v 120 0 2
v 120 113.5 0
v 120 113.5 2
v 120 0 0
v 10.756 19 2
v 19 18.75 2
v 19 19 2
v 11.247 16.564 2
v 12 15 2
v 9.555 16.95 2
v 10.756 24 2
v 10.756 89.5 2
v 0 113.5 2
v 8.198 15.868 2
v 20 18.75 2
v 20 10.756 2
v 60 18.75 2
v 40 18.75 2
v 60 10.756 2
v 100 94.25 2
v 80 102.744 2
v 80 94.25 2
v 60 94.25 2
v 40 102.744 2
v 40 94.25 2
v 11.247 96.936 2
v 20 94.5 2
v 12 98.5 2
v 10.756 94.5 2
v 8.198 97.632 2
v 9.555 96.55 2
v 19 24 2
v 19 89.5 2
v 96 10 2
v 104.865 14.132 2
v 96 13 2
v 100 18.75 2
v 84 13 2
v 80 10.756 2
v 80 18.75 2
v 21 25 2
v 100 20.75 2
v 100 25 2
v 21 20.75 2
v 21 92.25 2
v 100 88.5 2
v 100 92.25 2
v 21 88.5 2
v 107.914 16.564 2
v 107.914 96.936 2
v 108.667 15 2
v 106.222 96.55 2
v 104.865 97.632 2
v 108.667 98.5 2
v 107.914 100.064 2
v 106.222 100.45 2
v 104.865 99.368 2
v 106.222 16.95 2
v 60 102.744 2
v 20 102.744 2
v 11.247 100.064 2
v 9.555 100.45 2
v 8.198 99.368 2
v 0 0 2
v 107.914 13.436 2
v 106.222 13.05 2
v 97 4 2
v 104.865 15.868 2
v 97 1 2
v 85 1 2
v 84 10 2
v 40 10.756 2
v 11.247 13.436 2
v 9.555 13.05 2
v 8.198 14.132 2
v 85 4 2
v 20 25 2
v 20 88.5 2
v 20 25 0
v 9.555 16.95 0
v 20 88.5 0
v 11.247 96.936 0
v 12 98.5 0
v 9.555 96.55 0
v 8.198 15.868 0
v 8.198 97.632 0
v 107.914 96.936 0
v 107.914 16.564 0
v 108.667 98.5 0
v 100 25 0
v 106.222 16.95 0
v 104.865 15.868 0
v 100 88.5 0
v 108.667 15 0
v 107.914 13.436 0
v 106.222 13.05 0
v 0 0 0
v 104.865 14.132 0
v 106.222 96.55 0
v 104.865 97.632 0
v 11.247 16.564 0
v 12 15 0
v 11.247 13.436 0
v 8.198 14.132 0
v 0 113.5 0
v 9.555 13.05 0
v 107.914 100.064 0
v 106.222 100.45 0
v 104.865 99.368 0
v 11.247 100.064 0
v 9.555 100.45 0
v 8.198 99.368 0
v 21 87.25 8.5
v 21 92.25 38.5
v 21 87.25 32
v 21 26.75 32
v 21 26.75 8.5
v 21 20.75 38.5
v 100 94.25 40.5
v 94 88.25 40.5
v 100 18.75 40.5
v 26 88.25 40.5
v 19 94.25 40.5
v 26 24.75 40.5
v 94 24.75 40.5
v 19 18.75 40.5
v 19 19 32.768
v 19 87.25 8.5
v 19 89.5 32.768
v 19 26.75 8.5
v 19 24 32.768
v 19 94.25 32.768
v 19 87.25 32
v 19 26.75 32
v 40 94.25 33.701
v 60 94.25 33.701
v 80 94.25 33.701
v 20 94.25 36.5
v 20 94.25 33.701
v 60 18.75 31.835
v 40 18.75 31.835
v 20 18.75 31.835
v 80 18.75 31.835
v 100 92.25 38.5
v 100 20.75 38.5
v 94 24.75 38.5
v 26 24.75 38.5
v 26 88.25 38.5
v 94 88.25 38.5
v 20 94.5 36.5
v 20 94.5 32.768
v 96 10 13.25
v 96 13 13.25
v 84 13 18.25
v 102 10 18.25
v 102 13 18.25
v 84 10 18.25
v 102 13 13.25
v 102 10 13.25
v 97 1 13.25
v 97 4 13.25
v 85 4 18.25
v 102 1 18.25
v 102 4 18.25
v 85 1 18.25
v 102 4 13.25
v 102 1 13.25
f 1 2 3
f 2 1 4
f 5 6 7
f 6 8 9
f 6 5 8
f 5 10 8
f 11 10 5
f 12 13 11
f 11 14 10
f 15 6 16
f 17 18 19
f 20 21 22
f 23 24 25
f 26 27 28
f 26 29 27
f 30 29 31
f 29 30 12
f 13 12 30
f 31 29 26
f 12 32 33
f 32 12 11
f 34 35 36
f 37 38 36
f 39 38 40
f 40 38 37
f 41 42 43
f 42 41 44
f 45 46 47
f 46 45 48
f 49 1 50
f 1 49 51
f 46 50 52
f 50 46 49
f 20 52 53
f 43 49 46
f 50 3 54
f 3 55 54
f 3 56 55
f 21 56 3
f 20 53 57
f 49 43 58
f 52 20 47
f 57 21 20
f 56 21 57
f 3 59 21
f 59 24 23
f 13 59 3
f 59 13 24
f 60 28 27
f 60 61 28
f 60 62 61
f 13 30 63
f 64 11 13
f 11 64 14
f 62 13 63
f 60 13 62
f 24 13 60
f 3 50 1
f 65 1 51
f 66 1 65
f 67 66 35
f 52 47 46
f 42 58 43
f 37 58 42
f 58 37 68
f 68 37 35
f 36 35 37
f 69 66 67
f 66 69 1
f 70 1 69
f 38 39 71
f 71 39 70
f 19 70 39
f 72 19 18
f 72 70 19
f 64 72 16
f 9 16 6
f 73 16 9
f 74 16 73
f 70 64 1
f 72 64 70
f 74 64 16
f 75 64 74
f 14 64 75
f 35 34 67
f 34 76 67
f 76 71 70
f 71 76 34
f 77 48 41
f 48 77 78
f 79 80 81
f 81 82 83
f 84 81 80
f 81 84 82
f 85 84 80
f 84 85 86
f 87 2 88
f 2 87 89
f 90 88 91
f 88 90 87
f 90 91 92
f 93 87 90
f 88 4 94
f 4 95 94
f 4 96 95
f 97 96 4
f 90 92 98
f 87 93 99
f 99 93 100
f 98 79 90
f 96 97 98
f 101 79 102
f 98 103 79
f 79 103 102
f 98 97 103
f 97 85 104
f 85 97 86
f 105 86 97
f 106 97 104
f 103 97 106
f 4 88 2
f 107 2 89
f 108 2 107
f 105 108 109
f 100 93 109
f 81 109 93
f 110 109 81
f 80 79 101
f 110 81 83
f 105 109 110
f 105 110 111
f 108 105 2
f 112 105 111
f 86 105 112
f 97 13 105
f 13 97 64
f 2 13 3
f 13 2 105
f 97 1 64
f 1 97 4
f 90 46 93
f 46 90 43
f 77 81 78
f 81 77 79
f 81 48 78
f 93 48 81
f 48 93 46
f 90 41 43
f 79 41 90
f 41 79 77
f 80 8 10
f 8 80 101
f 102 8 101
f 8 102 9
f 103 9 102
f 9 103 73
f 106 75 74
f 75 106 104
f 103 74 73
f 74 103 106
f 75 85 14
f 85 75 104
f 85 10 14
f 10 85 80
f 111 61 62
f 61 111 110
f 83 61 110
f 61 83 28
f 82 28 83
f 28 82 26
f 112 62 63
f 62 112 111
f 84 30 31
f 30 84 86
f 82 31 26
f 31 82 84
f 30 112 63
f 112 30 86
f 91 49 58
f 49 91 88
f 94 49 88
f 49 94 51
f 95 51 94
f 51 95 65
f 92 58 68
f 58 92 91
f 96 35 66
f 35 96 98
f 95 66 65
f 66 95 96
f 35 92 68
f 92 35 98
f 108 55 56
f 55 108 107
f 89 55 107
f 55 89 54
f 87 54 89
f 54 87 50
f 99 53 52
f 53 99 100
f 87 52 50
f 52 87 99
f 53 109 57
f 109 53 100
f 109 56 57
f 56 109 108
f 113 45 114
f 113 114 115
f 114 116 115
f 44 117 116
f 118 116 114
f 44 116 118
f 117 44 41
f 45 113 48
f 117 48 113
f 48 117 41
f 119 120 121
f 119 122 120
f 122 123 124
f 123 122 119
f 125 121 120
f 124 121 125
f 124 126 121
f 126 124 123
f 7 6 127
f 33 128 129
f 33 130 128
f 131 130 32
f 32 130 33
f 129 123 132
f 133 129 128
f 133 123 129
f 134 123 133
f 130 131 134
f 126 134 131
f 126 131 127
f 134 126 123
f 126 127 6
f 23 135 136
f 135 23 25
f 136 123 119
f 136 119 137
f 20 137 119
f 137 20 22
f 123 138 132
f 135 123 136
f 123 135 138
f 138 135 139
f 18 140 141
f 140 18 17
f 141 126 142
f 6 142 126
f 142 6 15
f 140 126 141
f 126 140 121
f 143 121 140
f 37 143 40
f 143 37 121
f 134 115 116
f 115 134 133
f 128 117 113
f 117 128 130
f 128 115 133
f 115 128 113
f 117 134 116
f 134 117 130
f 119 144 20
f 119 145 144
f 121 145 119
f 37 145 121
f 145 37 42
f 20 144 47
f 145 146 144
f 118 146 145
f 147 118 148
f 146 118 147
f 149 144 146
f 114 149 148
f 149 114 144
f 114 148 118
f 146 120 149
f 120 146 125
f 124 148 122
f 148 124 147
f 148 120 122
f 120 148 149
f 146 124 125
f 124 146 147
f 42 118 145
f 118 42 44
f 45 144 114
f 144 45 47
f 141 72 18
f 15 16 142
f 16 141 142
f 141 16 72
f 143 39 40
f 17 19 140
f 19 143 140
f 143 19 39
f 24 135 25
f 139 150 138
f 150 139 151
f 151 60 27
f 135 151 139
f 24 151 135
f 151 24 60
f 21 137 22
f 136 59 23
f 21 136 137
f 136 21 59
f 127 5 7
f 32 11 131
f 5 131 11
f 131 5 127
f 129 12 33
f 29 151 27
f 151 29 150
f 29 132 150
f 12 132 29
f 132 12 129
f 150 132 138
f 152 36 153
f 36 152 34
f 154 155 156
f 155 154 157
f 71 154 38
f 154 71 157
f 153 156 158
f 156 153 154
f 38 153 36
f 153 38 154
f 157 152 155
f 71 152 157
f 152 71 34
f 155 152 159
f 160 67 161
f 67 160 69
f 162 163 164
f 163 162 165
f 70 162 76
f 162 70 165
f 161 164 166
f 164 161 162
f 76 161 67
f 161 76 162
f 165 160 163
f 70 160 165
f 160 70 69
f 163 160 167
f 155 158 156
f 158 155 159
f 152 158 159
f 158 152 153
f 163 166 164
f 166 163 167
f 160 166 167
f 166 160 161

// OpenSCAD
width =     160/2;
depth =     73.5;
height = 36.5;
thick =      2;
plateSpacing = 40;
holder = 5;

difference() {
    cube([width + plateSpacing , depth + plateSpacing ,  thick]);
    translate([plateSpacing / 2, holder + plateSpacing / 2, -1]) cube([width , depth - (holder * 2) ,  thick + 2]);
    translate([(plateSpacing)/4 , plateSpacing / 2 - 5, -1])cylinder(20, 2,2);
    translate([(plateSpacing)/4 , depth + plateSpacing / 2 + 5 , -1])cylinder(20, 2,2);
    translate([width + plateSpacing / 1.5, plateSpacing / 2 - 5, -1])cylinder(20, 2,2);
    translate([width + plateSpacing / 1.5, depth + plateSpacing / 2 + 5 , -1])cylinder(20, 2,2);
}

module case() {
    cube([width, thick, height]);
    translate([0, depth,0]) cube([width, thick, height]);
    bottomHole = 6.5;
    translate([-thick + 1, 0, 0]) difference() {
        cube([thick, depth + thick, height + thick]);
        translate([-10, bottomHole +1.5, bottomHole]) cube([20, depth - bottomHole * 2 , height - bottomHole * 2]);
    }

    topHole = 6;
    translate([0, 0, height]) difference() {
        cube([width, depth  + thick, 2]);
        translate([topHole, topHole, -5]) cube([width - topHole * 2, depth + 2 - topHole * 2 , 10]);
    }
}

translate([plateSpacing / 2, (plateSpacing / 2) -( holder / 4), thick]) case();

module support() {
    translate([0,0, height]) { 
        rotate([0,180,180])difference() {
        cube([20, 20, height]);
        rotate([-15, 0, 0]) translate([-5, 0,  -5]) cube([40, 40, height + 20]);
        }
    }
}
translate([20,20,0]) support();
translate([60,20,0]) support();
translate([20, depth + plateSpacing / 2, 0]) mirror([0,1,0]) support();
translate([60, depth + plateSpacing / 2, 0]) mirror([0,1,0]) support();

module supportBottom() {
    translate([0,0, height]) { 
        rotate([0,180,90])difference() {
        cube([5, 10, height]);
        rotate([-15, 0, 0]) translate([-5, 0,  -5]) cube([40, 40, height + 20]);
        }
    }
}
translate([20,24,0]) supportBottom();
translate([20, depth + plateSpacing - 19,0]) supportBottom();

//translate([45, 7.5, 7]) {
//    rotate([0, -90, 0])
//    difference() {
//      cylinder(25, 6, 6);
//      translate([0,0,-2.5])cylinder(30, 5, 5);
//       translate([2.5,-2.5,-2.5]) cube([8,4, 50]); 
//    }
//}
powerHolderPos = 50;
translate([34 + powerHolderPos, 10.0, 0]) cube([12, 3, height / 2]); 
translate([35 + powerHolderPos, 1.0, 0]) cube([12, 3, height / 2]); 
translate([40 + powerHolderPos + 6, 10.0, height / 2 - 5]) cube([6 ,3, 5]); 
translate([40 + powerHolderPos + 6, 1.0, height / 2 - 5]) cube([6, 3, 5]); 
